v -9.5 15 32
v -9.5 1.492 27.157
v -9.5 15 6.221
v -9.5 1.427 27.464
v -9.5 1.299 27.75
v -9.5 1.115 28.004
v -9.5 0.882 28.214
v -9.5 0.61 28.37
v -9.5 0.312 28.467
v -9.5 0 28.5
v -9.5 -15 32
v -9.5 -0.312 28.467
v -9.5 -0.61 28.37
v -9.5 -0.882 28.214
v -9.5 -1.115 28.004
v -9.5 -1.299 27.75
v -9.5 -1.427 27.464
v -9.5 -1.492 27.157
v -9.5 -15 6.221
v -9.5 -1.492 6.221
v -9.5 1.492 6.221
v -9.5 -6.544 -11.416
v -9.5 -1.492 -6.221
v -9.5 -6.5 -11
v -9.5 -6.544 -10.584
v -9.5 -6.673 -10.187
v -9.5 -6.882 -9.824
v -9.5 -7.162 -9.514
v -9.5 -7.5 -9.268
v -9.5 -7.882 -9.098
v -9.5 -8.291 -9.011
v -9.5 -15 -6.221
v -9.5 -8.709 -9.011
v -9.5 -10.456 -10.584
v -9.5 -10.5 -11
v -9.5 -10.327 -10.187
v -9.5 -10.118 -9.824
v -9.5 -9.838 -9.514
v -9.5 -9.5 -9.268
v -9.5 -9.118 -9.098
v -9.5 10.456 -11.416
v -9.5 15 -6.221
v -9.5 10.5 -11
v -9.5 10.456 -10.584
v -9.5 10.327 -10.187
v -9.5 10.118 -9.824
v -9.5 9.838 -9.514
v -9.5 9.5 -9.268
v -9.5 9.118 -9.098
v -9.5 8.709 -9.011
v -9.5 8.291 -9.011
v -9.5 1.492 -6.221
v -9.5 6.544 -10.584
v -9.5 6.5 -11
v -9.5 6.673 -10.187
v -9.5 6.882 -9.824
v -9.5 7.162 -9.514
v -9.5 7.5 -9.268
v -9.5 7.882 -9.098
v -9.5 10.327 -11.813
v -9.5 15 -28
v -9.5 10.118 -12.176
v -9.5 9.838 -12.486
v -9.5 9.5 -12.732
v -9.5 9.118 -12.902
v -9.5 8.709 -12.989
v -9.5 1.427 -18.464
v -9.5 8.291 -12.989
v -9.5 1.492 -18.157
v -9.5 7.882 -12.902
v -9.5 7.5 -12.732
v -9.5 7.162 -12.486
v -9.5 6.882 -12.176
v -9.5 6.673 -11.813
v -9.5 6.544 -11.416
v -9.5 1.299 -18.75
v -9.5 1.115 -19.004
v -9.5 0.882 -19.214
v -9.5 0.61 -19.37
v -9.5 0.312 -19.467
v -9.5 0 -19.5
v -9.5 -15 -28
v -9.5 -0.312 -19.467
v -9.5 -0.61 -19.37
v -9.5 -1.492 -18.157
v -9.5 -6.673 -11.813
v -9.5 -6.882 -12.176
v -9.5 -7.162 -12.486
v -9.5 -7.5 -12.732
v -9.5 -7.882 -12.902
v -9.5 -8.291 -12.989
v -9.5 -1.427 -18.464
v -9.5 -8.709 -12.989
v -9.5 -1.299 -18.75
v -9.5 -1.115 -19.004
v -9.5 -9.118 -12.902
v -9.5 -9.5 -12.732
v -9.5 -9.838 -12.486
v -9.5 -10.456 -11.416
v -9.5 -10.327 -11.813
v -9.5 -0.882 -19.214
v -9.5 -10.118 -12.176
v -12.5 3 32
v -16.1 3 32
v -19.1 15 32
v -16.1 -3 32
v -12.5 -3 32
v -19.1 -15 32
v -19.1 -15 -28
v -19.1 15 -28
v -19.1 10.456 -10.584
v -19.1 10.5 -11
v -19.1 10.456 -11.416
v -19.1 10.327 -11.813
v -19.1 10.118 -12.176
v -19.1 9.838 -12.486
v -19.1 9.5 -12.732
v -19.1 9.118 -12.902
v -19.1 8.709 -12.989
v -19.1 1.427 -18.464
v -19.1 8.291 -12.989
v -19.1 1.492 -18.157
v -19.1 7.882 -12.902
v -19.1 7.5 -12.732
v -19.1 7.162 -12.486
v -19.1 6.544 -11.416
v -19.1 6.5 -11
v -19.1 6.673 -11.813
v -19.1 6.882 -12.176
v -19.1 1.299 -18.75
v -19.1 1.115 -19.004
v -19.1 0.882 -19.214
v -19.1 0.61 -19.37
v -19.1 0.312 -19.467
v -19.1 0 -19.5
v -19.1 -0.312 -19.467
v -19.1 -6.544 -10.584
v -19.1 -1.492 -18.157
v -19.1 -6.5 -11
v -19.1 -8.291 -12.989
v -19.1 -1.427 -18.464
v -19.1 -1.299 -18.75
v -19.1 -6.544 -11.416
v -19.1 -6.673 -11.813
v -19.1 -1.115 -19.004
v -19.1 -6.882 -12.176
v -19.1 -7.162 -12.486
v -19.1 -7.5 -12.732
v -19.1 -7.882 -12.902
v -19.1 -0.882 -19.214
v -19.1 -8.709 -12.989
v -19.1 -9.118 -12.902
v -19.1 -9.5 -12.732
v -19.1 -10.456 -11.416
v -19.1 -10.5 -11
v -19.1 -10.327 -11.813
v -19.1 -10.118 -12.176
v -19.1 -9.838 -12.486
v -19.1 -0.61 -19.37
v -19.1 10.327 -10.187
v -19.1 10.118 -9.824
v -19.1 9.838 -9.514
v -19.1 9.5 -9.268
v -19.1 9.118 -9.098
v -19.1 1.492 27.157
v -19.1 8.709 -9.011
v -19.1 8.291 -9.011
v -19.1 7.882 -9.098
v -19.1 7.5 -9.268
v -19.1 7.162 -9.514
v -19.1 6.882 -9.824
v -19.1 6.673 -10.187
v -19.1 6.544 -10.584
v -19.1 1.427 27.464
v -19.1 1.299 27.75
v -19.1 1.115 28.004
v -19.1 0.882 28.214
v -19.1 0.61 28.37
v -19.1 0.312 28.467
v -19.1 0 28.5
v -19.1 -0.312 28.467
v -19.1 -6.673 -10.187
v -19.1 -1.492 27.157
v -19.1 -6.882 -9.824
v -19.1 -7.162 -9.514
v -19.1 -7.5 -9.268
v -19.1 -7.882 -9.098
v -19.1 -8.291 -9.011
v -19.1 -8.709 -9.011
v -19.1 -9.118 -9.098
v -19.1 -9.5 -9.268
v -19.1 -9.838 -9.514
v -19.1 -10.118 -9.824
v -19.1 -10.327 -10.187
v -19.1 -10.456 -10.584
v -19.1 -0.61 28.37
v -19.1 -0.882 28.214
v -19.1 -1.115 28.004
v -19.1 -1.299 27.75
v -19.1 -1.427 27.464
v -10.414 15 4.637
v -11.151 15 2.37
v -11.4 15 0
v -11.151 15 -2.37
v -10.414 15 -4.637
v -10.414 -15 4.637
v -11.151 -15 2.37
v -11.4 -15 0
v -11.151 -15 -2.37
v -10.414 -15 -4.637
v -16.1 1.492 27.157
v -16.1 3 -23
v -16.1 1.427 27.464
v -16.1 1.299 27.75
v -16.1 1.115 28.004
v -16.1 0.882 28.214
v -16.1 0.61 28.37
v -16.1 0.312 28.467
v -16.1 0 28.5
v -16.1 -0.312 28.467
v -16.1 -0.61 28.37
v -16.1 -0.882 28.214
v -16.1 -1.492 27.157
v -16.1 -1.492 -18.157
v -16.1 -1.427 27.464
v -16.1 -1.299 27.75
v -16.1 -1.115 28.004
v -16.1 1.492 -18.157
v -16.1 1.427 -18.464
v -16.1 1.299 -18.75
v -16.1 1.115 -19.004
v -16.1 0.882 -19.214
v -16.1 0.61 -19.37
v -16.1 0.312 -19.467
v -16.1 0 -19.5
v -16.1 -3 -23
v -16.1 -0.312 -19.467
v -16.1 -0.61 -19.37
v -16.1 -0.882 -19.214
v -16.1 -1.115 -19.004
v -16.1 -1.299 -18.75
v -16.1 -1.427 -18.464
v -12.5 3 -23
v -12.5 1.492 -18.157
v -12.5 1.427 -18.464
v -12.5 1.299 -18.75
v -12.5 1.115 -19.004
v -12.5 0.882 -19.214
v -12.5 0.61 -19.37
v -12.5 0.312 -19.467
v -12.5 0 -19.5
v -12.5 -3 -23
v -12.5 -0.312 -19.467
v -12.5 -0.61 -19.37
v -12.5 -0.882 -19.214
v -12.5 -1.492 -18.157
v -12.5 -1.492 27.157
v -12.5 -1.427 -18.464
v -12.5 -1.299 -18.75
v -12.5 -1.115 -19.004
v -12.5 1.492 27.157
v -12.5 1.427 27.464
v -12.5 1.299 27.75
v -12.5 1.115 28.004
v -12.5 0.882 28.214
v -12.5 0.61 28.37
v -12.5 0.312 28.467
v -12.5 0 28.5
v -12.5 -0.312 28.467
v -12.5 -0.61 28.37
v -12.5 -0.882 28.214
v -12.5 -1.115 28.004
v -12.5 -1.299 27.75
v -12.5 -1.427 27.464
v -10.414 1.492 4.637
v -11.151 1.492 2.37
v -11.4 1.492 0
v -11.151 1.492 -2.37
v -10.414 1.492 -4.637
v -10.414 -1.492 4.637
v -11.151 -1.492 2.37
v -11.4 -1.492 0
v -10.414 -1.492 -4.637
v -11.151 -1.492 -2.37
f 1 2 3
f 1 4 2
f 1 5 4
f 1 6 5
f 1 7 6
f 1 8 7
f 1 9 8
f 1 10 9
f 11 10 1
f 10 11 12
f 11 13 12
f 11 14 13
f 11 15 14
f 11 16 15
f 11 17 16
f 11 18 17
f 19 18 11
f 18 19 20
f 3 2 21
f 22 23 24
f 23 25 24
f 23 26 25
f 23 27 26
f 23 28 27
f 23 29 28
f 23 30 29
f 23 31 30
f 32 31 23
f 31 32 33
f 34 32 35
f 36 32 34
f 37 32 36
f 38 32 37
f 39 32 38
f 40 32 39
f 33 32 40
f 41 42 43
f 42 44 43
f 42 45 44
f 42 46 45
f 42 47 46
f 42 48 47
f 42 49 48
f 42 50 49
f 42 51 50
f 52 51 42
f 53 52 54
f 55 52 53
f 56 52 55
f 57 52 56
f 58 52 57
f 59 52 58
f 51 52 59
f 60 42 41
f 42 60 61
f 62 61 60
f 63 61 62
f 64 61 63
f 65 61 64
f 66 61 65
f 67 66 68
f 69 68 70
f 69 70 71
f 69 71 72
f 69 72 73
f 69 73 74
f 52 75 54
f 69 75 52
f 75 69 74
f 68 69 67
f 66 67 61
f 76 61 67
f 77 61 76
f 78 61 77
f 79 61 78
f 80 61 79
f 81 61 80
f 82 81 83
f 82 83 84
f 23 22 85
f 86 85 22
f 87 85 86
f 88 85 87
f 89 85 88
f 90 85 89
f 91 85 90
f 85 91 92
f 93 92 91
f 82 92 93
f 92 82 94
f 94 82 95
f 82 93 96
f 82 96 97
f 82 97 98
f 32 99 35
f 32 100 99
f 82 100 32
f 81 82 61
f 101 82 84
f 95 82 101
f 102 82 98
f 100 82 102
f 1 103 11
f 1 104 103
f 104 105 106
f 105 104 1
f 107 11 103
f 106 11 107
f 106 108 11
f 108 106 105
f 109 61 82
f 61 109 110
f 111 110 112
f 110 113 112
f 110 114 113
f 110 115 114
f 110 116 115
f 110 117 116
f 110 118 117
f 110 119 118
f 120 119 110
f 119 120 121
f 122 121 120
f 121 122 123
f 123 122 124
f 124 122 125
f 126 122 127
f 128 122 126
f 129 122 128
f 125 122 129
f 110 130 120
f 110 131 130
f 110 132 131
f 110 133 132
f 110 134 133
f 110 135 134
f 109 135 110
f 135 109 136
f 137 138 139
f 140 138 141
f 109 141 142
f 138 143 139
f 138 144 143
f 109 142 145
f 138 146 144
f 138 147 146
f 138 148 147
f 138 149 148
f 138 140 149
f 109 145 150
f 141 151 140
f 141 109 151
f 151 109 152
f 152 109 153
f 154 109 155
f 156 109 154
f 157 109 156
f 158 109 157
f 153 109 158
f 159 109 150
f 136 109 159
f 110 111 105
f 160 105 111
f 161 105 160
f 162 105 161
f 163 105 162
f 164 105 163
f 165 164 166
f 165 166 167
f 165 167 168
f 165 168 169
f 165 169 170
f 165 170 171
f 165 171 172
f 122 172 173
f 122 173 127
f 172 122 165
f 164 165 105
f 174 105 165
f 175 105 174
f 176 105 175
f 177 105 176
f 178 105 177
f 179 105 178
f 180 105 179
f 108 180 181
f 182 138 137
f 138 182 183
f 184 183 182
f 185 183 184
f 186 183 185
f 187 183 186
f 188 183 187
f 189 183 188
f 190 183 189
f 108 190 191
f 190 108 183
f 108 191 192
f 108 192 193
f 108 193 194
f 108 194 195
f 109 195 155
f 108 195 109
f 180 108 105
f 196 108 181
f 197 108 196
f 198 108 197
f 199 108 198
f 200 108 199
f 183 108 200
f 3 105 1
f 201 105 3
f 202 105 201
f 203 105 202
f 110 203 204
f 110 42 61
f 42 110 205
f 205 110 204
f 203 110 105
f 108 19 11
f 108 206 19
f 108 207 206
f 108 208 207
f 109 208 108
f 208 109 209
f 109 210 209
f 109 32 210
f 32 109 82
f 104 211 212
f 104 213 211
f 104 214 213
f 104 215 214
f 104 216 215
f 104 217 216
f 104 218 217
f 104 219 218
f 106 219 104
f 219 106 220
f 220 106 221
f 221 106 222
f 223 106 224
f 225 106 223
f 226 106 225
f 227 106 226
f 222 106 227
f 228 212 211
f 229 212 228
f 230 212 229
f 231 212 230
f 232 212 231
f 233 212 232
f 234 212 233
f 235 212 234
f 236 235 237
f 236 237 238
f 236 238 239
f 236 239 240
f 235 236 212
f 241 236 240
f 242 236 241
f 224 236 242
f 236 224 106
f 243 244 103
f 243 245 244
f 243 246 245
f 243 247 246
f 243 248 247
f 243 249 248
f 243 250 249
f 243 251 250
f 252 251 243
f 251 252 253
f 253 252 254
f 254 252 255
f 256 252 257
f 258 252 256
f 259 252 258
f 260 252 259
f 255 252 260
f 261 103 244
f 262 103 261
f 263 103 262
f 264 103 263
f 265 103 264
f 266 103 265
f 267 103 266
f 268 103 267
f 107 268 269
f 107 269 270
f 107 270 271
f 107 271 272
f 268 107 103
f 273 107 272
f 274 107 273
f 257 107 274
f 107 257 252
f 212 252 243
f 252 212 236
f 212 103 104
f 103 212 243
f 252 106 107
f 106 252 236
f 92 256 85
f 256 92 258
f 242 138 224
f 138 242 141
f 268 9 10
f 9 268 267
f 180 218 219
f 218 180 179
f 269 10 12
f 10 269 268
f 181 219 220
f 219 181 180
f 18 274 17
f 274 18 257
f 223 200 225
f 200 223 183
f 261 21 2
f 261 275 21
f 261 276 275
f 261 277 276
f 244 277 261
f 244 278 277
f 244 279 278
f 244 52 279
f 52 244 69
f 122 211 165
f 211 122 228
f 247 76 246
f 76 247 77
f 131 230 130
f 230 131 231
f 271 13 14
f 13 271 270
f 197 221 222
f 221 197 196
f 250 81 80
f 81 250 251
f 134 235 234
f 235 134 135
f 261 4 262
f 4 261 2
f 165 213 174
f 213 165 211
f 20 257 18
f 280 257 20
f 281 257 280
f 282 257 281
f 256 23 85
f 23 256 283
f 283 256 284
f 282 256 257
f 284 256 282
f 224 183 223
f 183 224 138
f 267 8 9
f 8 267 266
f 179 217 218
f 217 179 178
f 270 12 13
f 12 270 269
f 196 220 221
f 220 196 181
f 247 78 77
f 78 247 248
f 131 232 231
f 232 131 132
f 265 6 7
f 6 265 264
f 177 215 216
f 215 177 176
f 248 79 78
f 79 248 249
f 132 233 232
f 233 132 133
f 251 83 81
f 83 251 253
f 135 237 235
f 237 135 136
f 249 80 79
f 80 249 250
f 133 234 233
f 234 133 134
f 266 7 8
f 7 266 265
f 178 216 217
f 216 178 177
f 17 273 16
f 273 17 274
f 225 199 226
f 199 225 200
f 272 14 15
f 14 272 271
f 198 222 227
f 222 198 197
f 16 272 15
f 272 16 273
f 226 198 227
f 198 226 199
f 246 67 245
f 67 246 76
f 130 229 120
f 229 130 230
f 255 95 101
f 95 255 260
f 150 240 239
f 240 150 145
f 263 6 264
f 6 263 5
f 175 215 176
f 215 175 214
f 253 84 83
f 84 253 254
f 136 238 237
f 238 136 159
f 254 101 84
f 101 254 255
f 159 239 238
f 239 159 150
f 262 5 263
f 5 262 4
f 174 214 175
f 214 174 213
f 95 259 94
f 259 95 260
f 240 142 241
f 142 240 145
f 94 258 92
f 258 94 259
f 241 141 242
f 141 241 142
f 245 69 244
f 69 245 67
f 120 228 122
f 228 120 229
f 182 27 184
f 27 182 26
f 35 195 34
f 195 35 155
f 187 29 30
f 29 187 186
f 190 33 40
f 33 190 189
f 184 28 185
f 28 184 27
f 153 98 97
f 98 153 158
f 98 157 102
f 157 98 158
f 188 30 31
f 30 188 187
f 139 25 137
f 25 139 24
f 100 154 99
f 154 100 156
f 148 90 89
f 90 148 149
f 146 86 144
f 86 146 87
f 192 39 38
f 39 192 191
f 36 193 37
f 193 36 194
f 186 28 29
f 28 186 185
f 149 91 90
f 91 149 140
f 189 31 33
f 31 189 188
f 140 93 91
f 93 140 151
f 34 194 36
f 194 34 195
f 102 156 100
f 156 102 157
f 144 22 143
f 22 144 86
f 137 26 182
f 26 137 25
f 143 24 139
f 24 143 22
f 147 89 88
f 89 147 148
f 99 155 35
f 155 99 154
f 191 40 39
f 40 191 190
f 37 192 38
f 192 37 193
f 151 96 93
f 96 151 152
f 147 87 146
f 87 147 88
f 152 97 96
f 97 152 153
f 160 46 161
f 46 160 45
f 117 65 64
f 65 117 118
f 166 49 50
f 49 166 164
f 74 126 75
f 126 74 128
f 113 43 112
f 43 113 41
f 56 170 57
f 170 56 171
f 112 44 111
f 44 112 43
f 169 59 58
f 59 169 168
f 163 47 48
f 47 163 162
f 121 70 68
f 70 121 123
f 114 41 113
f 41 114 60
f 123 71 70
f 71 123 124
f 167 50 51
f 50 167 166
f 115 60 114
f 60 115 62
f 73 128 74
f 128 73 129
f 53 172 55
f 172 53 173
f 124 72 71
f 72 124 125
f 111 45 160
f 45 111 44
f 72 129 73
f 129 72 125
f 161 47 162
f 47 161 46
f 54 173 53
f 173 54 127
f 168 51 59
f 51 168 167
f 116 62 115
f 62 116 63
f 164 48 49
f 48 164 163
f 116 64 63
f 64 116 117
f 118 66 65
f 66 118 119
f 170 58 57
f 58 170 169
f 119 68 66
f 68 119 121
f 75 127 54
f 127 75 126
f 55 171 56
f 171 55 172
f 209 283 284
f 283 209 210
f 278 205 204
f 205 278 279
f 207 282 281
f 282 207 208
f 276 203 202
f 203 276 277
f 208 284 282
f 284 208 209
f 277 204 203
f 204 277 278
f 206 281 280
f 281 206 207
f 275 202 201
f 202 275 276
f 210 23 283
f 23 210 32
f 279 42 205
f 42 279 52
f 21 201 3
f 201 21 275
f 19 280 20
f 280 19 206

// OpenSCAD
// file: hexagone.scad
function cot(x)=1/tan(x);

module Hexagone(cle,h)
{
	angle = 360/6;		// 6 pans
	cote = cle * cot(angle);
	echo(angle, cot(angle), cote);
	echo(acos(.6));

	union()
	{
		rotate([0,0,0])
			cube([cle,cote,h],center=true);
		rotate([0,0,angle])
			cube([cle,cote,h],center=true);
		rotate([0,0,2*angle])
			cube([cle,cote,h],center=true);
	}
}
// file: utils.scad
module mv(x, y, z) {
    translate([x,y,z]) {
        children([0 : $children]);
   }
}

module rot(x, y, z) {
    rotate([x,y,z]) {
        children([0 : $children]);
   }
}

module trans() {
    %children();
}

module hash() {
    #children();
}

module fidt() {
    children(0);
    difference() {
        trans()
        children(1);
        hash()
        children(0);
   }
}

module fid() {
    difference() {
        children(1);
        children(0);
   }
}

module dif() {
    difference() {
        children(0);
        children(1);
   }
}

module dift() {
    children(1);
    difference() {
        trans()
        children(0);
        hash()
        children(1);
   }
}

module mirx() {
    children(0);
    mirror([1,0,0]) {
        children(0);
   }
}

module miry() {
    children(0);
    mirror([0,1,0]) {
        children(0);
   }
}

module mirz() {
    children(0);
    mirror([0,0,1]) {
        children(0);
   }
}
// main file
include<utils.scad>
include<hexagone.scad>

$fn=30;

diam=19;
height=30;

screw_hole=4;
screw_dist=17;
screw_dist_cyl=11;


module hole(screw_dist) {
mv(0,-screw_dist_cyl,screw_dist/2)
rot(0,90,0)
cylinder(d=4, h=100, center=true);
}

fid() {
rot(90,0,0)
dif() {
    union() {
        dif() {
            union() {
                mv(diam/4,0,0)
                    cube([diam/2,diam*1.2,height], center=true);
                cylinder(h=height+1, d=diam*1.2, center = true);
            }

            union() {
                mv(diam/4,0,0)
                    cube([diam/2,diam,height+1], center=true);
                mv(diam/2,0,0)
                    cube([diam/2,diam,height+1], center=true);
                cylinder(h=height+1, d=diam, center = true);
            }
        }

        mv(0,-diam,0)
            cube([diam, diam, height], center=true);
    }

    union() {
        hole(screw_dist);
        hole(-screw_dist);
    }
}


/*mv(-diam,0,0)*/
/*rot(0,0,90)*/
/*cube([24,8,37], center=true);*/


nuts_diam=5.5;
nuts_height=2.4;
plate_lenght=60;

/*rot(0,0,90)Hexagone(cle=nuts_diam,h=nuts_height);*/

dif(){
mv(-diam/2-((nuts_height*4)/2),0,2) {
    rot(0,-90,0) {
        fid() {
            hull(){
                mv(25,0,00)
                    cylinder(d=3,h=100, center=true);
                mv(-20,0,00)
                    cylinder(d=3,h=100, center=true);
            }

            fid() {
                mv(25,0,0)cube([100,nuts_diam+0.5, nuts_height+1.2], center=true);
                rot(0,90,0)cube([nuts_height*4,height, plate_lenght], center=true);
            }
        }
    }
}

rot(90,0,0) {
hole(screw_dist);
hole(-screw_dist);
}
}
}
/*mv(0,0,50) {*/
/*mv(diam/4,0,0)*/
/*cube([diam/2,diam*1.3,height], center=true);*/
/*cylinder(h=height, d=diam*1.3, center = true);*/
/*}*/

/*mv(0,0,-50) {*/
/*mv(diam/4,0,0)*/
/*cube([diam/2,diam,height+1], center=true);*/
/*cylinder(h=height+1, d=diam, center = true);*/
/*}*/
